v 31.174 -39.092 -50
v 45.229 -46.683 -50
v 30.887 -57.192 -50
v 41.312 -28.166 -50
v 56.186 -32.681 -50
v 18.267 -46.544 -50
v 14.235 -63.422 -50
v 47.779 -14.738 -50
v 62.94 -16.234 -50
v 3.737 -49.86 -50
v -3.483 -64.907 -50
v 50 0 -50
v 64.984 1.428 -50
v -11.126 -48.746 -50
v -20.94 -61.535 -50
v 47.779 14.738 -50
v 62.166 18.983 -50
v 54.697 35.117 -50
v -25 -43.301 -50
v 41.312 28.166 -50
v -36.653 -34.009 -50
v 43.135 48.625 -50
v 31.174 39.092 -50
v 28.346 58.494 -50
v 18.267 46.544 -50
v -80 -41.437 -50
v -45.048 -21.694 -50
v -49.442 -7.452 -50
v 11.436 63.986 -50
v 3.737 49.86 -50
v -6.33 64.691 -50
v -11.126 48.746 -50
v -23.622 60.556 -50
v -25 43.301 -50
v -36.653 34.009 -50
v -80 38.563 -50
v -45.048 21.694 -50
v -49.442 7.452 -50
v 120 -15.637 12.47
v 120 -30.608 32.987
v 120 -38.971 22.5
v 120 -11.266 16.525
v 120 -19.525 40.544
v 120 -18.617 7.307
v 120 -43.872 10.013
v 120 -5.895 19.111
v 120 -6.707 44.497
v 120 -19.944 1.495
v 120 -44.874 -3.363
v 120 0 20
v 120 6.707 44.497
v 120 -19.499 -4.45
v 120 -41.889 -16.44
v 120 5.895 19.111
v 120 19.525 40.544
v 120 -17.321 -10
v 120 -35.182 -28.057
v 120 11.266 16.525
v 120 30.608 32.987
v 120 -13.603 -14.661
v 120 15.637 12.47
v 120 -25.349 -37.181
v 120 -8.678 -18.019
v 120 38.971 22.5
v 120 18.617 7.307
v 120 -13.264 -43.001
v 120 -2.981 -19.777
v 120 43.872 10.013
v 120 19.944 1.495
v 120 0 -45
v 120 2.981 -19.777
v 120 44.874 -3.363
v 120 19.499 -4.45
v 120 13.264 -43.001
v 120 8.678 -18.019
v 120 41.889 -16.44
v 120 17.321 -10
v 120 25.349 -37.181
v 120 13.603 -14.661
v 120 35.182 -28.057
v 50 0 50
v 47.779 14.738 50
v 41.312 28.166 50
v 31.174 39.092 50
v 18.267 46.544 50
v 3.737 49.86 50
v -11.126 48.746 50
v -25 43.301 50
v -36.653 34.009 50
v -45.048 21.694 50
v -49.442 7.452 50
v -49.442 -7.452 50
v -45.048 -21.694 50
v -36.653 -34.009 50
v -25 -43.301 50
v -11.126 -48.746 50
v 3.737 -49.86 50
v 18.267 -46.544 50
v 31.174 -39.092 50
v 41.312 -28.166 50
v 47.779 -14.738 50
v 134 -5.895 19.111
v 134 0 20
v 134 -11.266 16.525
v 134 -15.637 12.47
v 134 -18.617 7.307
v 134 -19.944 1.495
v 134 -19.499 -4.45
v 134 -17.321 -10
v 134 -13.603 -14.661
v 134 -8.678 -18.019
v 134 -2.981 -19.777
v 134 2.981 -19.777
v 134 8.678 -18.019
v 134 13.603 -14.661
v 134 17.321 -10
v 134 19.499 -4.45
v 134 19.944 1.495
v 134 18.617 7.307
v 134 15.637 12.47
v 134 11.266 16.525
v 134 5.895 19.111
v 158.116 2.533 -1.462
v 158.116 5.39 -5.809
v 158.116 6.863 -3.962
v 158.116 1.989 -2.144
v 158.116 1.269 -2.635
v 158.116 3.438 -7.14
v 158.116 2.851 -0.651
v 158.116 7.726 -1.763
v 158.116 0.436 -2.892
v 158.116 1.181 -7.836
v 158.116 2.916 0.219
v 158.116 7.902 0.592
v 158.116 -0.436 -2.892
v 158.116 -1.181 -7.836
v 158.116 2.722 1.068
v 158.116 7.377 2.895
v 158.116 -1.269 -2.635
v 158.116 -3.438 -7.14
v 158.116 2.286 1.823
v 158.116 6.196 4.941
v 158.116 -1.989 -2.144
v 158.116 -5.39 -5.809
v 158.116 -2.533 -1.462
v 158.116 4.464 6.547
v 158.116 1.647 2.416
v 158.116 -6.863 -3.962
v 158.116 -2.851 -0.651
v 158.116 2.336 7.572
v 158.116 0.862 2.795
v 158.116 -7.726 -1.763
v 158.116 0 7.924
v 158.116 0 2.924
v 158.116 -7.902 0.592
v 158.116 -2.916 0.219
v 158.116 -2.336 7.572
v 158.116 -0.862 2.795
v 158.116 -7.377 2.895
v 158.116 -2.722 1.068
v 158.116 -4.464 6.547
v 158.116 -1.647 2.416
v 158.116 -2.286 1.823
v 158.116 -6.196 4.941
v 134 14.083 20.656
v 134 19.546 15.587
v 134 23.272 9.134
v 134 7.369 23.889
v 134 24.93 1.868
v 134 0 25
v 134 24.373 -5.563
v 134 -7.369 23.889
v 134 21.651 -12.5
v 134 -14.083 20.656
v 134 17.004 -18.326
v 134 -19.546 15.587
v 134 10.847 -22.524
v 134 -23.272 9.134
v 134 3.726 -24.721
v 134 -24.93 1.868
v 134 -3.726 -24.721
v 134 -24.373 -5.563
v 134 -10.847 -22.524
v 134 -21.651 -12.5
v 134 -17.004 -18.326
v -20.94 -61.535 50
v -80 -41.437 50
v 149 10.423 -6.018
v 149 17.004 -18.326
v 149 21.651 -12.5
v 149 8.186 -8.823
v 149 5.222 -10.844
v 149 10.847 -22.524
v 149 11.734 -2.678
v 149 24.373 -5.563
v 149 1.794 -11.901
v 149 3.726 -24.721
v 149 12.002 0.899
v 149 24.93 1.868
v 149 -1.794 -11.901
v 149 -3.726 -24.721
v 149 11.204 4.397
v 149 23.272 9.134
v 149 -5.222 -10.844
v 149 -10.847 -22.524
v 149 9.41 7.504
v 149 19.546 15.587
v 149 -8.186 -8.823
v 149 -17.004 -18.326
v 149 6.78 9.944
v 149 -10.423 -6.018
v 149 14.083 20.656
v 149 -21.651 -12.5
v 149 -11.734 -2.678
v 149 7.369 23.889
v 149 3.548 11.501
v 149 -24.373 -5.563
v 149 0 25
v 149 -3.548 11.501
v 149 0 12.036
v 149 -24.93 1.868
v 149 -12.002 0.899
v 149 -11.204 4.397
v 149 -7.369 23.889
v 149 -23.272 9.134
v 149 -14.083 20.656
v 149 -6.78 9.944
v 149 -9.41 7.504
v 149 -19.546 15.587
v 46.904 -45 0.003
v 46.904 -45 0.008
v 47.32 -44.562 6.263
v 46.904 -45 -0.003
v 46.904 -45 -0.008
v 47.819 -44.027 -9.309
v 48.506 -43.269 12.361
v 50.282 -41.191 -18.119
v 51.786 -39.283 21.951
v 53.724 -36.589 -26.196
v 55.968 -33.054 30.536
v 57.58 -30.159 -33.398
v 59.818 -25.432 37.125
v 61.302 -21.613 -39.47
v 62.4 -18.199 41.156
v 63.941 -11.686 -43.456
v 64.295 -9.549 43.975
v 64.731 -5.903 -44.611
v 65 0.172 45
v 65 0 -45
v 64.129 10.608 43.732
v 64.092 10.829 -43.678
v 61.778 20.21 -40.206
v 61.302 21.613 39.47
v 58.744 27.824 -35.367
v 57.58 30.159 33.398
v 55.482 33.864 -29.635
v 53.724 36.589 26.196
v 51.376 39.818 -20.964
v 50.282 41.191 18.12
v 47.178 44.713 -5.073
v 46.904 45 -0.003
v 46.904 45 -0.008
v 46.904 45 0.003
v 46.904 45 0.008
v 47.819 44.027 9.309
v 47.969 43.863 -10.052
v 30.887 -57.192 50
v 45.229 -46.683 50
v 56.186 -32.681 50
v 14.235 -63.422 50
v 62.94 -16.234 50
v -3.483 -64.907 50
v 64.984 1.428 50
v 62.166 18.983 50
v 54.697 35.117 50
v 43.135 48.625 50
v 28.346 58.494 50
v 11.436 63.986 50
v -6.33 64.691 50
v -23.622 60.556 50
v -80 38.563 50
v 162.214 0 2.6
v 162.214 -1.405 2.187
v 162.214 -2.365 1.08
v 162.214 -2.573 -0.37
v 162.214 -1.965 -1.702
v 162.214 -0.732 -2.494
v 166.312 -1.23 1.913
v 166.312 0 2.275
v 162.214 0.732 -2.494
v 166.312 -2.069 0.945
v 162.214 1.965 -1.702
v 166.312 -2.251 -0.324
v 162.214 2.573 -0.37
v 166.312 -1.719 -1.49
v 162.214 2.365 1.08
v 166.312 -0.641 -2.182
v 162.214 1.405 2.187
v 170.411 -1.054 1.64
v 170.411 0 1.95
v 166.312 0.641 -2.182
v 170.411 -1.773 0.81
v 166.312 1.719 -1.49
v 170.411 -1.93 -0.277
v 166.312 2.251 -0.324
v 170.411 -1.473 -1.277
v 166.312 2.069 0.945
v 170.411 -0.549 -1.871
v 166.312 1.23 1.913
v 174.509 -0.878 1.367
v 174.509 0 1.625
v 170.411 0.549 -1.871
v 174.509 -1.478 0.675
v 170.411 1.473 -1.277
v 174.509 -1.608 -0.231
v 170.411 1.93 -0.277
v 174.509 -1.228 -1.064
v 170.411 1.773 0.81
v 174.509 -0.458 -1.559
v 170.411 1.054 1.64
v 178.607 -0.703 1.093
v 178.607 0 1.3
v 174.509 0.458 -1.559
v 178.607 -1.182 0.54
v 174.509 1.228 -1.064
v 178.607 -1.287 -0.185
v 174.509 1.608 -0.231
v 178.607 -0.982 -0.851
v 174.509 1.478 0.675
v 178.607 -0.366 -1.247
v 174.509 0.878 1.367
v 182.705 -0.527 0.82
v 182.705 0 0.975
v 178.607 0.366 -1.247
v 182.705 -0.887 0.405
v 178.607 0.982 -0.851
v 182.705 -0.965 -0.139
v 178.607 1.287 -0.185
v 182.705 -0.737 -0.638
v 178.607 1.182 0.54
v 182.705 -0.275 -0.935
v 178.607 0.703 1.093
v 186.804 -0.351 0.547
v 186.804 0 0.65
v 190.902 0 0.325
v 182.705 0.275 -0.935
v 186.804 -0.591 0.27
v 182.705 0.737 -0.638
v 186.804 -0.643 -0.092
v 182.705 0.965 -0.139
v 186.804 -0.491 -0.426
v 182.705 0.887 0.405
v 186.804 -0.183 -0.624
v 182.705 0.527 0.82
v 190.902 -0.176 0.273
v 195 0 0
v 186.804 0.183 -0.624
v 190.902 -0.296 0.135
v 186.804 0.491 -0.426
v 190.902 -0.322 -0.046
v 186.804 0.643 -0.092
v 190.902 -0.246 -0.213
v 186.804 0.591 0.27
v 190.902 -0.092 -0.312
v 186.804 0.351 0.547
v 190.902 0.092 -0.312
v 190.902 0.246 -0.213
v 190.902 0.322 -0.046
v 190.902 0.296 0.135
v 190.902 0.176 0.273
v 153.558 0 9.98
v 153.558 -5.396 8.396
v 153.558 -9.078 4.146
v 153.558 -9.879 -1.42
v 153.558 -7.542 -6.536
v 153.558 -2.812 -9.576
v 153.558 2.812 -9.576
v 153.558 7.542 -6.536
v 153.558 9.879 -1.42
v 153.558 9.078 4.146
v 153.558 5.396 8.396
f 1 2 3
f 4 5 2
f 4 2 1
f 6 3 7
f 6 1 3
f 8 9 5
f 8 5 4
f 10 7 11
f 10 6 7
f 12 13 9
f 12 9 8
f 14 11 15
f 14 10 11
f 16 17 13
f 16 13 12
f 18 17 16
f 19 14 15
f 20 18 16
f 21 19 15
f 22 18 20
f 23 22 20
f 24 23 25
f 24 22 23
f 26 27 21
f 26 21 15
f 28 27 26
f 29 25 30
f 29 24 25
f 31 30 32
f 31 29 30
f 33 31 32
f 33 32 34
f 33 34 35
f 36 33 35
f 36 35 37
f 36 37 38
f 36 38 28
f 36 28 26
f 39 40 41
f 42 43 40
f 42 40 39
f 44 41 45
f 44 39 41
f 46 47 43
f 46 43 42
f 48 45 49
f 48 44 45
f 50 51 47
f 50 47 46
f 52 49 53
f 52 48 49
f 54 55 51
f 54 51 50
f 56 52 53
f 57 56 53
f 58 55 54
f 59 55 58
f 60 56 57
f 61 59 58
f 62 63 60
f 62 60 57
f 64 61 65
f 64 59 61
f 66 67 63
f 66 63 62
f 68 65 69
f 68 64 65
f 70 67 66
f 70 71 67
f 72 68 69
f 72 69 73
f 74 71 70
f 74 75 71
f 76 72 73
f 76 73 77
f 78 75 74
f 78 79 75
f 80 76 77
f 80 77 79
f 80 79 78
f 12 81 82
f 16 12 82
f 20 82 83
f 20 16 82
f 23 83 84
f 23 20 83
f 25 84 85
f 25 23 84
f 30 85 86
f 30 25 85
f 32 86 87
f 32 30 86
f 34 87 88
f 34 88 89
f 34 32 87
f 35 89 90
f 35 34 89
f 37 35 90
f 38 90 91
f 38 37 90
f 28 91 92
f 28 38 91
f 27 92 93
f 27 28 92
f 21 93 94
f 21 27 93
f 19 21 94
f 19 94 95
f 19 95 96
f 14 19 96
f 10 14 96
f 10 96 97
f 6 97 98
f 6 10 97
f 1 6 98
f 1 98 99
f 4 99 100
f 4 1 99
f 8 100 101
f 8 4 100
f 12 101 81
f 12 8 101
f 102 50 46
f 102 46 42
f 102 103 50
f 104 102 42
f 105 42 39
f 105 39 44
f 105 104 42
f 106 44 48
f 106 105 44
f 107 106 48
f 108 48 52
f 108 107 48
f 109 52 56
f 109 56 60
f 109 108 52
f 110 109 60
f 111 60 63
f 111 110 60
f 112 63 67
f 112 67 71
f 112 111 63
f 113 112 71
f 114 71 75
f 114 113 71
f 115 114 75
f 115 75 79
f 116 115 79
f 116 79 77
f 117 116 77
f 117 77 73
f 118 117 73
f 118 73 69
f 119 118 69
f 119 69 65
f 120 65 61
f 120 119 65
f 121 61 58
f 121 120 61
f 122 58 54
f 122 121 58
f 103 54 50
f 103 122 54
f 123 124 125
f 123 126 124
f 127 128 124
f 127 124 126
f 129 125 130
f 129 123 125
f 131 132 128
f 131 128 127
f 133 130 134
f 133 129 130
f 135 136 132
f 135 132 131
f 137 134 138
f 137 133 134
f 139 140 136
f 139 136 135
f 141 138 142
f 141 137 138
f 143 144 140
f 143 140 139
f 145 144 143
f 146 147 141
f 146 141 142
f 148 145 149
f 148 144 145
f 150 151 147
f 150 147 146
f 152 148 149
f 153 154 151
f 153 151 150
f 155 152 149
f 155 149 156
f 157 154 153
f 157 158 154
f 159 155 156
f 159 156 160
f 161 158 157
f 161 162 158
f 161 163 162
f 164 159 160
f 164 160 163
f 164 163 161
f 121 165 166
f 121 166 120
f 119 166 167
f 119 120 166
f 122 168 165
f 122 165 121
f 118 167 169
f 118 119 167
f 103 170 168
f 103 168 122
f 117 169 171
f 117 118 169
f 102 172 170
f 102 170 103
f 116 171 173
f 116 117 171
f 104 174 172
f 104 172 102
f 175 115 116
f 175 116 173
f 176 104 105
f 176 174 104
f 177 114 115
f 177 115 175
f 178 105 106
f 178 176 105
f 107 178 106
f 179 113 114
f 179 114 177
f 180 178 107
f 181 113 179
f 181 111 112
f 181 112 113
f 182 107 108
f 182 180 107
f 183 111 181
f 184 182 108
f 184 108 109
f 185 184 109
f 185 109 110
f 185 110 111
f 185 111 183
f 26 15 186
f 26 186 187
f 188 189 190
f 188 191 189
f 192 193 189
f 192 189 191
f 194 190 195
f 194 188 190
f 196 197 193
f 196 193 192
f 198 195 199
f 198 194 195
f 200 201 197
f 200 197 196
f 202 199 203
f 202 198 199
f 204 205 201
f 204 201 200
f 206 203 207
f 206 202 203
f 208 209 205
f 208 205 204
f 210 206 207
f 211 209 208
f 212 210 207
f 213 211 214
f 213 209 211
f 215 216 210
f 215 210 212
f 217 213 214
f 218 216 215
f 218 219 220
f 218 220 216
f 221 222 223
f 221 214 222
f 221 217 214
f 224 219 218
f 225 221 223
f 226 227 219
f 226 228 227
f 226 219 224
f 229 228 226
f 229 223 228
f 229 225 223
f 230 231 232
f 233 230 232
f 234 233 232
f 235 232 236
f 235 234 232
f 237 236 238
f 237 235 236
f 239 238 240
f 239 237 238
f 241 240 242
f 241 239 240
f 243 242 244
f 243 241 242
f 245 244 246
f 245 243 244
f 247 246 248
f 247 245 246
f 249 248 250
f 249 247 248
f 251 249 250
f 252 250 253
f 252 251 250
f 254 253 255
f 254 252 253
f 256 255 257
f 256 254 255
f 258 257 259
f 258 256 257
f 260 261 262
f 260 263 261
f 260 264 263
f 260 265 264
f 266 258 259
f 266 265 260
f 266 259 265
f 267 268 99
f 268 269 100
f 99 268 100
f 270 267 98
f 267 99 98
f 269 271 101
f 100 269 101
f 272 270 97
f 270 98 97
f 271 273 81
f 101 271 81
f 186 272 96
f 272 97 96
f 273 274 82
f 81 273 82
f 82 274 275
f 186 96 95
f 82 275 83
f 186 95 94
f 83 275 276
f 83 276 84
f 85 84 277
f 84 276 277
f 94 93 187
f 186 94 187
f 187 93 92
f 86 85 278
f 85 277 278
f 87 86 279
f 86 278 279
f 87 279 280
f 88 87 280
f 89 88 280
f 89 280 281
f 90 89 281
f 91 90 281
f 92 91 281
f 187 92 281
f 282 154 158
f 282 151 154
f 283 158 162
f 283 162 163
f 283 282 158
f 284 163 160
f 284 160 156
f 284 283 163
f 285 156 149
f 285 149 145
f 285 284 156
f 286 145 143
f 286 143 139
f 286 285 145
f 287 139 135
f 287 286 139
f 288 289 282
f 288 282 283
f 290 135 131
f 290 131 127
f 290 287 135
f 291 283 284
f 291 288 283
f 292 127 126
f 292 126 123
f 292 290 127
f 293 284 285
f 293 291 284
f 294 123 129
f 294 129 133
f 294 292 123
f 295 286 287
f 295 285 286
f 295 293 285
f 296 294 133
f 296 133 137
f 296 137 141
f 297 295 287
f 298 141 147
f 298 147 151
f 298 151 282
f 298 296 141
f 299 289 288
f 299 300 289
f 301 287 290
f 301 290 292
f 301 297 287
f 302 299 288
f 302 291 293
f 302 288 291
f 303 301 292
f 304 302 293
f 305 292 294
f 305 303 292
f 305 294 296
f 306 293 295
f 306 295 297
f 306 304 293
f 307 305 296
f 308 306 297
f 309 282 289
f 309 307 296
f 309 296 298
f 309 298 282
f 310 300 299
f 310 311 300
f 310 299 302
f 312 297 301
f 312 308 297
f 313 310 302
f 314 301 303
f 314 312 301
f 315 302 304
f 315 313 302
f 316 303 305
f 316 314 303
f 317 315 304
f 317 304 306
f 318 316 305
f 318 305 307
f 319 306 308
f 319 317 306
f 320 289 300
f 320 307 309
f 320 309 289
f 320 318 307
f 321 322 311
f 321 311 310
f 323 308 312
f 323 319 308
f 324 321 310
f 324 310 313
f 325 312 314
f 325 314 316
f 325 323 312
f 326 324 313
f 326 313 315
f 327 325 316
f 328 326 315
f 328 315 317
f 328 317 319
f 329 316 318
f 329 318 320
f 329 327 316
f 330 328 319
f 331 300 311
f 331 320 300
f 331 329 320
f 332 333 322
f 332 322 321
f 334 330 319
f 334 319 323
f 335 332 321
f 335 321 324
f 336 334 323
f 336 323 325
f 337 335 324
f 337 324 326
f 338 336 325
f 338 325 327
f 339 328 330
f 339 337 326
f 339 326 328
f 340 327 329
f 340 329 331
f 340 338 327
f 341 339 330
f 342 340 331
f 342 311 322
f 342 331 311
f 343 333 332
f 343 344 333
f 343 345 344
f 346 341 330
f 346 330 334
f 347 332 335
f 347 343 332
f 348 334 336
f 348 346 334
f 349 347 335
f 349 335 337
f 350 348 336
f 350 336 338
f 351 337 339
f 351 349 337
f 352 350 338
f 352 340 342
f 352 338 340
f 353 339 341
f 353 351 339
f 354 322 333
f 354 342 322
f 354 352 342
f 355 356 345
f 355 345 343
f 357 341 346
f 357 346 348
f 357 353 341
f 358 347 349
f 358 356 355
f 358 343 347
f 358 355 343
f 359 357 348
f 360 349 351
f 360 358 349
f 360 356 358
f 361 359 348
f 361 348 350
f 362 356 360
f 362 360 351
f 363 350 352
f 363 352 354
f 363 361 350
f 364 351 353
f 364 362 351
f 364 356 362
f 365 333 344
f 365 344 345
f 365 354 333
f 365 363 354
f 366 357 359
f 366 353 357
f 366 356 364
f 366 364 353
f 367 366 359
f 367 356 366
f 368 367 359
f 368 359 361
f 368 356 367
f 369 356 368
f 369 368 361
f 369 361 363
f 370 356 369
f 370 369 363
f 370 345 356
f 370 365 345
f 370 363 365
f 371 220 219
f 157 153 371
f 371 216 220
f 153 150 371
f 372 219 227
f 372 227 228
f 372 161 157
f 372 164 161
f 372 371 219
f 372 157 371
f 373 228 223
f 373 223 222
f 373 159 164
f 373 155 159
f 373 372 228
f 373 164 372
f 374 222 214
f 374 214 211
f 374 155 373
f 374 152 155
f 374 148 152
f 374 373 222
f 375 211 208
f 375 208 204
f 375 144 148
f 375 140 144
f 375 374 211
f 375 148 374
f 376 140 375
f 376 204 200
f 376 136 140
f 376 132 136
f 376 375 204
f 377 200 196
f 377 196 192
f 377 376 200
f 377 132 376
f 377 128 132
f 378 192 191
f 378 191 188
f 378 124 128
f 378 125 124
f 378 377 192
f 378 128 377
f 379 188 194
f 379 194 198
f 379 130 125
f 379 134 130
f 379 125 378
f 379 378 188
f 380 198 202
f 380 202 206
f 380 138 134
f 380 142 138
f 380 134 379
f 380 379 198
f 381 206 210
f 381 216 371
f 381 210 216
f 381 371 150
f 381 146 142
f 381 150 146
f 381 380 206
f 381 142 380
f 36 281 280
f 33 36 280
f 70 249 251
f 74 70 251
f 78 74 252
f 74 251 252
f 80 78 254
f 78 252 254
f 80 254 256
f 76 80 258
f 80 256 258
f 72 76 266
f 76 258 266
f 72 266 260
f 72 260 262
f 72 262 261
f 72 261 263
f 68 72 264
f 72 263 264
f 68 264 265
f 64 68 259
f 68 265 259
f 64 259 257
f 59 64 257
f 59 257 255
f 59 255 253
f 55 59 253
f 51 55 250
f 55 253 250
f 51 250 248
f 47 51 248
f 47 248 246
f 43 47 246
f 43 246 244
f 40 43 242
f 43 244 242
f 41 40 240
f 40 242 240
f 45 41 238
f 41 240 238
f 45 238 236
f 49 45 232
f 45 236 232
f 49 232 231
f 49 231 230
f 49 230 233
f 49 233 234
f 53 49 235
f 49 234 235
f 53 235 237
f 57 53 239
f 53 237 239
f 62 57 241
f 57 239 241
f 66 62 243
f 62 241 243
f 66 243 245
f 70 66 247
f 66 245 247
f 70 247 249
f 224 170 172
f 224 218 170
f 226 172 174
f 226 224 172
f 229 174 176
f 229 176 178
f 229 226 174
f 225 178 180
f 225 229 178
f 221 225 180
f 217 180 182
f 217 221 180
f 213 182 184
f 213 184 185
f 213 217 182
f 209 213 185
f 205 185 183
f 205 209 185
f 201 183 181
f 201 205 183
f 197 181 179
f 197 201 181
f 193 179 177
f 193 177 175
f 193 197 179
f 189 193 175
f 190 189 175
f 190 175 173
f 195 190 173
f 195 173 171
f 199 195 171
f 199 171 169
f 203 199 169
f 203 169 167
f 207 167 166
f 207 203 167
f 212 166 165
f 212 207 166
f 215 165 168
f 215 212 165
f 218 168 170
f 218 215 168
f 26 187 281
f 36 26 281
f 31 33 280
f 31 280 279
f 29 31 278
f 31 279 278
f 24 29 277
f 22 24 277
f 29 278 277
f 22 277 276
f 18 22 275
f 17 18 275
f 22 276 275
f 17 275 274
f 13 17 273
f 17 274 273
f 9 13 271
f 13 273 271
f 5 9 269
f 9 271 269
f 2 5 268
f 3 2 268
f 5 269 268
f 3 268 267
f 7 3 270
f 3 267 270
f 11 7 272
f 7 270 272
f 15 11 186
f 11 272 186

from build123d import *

# Parameters (mm, degrees)
SKETCH1_R               = 50
BOSS_EXTRUDE1_DEPTH     = 50
BOSS_EXTRUDE2_START     = -73.095841729
BOSS_EXTRUDE2_OUTLINE_R = 45
BOSS_EXTRUDE2_DEPTH     = 73.095841729
BOSS_EXTRUDE2_START_2   = -46
BOSS_EXTRUDE2_2_DEPTH   = 92


with BuildPart() as part:
    # Sketch1 → Boss-Extrude1 (new, symmetric)
    with BuildSketch(Plane.XY):
        with BuildLine():
            Line((-80, 38.563284016), (-23.622164647, 60.555704417))
            ThreePointArc((-23.622164647, 60.555704417), (64.984321325, 1.427579024), (-20.940077251, -61.534650115))
            Line((-20.940077251, -61.534650115), (-80, -41.436715984))
            Line((-80, -41.436715984), (-80, 38.563284016))
        make_face()
        Circle(SKETCH1_R, mode=Mode.SUBTRACT)
    extrude(amount=BOSS_EXTRUDE1_DEPTH, both=True)


with BuildPart() as body_2:
    # Boss-Extrude2: read off the stored shape, not the designer's step
    # Boss-Extrude2 outline → Boss-Extrude2 (new body)
    with BuildSketch(Plane(origin=(120, 0, 0), x_dir=(0, 0, -1), z_dir=(1, 0, 0)).offset(BOSS_EXTRUDE2_START)):
        Circle(BOSS_EXTRUDE2_OUTLINE_R)
    extrude(amount=BOSS_EXTRUDE2_DEPTH)

    # Boss-Extrude2 2 outline → Boss-Extrude2 2 (cut)
    with BuildSketch(Plane.XY.offset(BOSS_EXTRUDE2_START_2)):
        with BuildLine():
            ThreePointArc((46.904157921, -44.999999664), (65, 0), (46.90415792, 44.999999664))
            Line((46.90415792, 44.999999664), (46.904157921, -44.999999664))
        make_face()
    extrude(amount=BOSS_EXTRUDE2_2_DEPTH, mode=Mode.SUBTRACT)

    # Sketch3 → Revolve1 (revolve)
    with BuildSketch(Plane.XY, mode=Mode.PRIVATE) as revolve1_sk:
        Polygon((120, 0), (120, -20), (134, -20), (134, -25), (149, -25), (149, -12.035770347), (158.115753312, -7.924439472), (158.115753312, -2.924439472), (195, 0), align=None)
    revolve(revolve1_sk.sketch.rotate(Axis((-80, 0, 0), (1, 0, 0)), 270), axis=Axis((-80, 0, 0), (1, 0, 0)))


solid = Compound([part.part, body_2.part])
